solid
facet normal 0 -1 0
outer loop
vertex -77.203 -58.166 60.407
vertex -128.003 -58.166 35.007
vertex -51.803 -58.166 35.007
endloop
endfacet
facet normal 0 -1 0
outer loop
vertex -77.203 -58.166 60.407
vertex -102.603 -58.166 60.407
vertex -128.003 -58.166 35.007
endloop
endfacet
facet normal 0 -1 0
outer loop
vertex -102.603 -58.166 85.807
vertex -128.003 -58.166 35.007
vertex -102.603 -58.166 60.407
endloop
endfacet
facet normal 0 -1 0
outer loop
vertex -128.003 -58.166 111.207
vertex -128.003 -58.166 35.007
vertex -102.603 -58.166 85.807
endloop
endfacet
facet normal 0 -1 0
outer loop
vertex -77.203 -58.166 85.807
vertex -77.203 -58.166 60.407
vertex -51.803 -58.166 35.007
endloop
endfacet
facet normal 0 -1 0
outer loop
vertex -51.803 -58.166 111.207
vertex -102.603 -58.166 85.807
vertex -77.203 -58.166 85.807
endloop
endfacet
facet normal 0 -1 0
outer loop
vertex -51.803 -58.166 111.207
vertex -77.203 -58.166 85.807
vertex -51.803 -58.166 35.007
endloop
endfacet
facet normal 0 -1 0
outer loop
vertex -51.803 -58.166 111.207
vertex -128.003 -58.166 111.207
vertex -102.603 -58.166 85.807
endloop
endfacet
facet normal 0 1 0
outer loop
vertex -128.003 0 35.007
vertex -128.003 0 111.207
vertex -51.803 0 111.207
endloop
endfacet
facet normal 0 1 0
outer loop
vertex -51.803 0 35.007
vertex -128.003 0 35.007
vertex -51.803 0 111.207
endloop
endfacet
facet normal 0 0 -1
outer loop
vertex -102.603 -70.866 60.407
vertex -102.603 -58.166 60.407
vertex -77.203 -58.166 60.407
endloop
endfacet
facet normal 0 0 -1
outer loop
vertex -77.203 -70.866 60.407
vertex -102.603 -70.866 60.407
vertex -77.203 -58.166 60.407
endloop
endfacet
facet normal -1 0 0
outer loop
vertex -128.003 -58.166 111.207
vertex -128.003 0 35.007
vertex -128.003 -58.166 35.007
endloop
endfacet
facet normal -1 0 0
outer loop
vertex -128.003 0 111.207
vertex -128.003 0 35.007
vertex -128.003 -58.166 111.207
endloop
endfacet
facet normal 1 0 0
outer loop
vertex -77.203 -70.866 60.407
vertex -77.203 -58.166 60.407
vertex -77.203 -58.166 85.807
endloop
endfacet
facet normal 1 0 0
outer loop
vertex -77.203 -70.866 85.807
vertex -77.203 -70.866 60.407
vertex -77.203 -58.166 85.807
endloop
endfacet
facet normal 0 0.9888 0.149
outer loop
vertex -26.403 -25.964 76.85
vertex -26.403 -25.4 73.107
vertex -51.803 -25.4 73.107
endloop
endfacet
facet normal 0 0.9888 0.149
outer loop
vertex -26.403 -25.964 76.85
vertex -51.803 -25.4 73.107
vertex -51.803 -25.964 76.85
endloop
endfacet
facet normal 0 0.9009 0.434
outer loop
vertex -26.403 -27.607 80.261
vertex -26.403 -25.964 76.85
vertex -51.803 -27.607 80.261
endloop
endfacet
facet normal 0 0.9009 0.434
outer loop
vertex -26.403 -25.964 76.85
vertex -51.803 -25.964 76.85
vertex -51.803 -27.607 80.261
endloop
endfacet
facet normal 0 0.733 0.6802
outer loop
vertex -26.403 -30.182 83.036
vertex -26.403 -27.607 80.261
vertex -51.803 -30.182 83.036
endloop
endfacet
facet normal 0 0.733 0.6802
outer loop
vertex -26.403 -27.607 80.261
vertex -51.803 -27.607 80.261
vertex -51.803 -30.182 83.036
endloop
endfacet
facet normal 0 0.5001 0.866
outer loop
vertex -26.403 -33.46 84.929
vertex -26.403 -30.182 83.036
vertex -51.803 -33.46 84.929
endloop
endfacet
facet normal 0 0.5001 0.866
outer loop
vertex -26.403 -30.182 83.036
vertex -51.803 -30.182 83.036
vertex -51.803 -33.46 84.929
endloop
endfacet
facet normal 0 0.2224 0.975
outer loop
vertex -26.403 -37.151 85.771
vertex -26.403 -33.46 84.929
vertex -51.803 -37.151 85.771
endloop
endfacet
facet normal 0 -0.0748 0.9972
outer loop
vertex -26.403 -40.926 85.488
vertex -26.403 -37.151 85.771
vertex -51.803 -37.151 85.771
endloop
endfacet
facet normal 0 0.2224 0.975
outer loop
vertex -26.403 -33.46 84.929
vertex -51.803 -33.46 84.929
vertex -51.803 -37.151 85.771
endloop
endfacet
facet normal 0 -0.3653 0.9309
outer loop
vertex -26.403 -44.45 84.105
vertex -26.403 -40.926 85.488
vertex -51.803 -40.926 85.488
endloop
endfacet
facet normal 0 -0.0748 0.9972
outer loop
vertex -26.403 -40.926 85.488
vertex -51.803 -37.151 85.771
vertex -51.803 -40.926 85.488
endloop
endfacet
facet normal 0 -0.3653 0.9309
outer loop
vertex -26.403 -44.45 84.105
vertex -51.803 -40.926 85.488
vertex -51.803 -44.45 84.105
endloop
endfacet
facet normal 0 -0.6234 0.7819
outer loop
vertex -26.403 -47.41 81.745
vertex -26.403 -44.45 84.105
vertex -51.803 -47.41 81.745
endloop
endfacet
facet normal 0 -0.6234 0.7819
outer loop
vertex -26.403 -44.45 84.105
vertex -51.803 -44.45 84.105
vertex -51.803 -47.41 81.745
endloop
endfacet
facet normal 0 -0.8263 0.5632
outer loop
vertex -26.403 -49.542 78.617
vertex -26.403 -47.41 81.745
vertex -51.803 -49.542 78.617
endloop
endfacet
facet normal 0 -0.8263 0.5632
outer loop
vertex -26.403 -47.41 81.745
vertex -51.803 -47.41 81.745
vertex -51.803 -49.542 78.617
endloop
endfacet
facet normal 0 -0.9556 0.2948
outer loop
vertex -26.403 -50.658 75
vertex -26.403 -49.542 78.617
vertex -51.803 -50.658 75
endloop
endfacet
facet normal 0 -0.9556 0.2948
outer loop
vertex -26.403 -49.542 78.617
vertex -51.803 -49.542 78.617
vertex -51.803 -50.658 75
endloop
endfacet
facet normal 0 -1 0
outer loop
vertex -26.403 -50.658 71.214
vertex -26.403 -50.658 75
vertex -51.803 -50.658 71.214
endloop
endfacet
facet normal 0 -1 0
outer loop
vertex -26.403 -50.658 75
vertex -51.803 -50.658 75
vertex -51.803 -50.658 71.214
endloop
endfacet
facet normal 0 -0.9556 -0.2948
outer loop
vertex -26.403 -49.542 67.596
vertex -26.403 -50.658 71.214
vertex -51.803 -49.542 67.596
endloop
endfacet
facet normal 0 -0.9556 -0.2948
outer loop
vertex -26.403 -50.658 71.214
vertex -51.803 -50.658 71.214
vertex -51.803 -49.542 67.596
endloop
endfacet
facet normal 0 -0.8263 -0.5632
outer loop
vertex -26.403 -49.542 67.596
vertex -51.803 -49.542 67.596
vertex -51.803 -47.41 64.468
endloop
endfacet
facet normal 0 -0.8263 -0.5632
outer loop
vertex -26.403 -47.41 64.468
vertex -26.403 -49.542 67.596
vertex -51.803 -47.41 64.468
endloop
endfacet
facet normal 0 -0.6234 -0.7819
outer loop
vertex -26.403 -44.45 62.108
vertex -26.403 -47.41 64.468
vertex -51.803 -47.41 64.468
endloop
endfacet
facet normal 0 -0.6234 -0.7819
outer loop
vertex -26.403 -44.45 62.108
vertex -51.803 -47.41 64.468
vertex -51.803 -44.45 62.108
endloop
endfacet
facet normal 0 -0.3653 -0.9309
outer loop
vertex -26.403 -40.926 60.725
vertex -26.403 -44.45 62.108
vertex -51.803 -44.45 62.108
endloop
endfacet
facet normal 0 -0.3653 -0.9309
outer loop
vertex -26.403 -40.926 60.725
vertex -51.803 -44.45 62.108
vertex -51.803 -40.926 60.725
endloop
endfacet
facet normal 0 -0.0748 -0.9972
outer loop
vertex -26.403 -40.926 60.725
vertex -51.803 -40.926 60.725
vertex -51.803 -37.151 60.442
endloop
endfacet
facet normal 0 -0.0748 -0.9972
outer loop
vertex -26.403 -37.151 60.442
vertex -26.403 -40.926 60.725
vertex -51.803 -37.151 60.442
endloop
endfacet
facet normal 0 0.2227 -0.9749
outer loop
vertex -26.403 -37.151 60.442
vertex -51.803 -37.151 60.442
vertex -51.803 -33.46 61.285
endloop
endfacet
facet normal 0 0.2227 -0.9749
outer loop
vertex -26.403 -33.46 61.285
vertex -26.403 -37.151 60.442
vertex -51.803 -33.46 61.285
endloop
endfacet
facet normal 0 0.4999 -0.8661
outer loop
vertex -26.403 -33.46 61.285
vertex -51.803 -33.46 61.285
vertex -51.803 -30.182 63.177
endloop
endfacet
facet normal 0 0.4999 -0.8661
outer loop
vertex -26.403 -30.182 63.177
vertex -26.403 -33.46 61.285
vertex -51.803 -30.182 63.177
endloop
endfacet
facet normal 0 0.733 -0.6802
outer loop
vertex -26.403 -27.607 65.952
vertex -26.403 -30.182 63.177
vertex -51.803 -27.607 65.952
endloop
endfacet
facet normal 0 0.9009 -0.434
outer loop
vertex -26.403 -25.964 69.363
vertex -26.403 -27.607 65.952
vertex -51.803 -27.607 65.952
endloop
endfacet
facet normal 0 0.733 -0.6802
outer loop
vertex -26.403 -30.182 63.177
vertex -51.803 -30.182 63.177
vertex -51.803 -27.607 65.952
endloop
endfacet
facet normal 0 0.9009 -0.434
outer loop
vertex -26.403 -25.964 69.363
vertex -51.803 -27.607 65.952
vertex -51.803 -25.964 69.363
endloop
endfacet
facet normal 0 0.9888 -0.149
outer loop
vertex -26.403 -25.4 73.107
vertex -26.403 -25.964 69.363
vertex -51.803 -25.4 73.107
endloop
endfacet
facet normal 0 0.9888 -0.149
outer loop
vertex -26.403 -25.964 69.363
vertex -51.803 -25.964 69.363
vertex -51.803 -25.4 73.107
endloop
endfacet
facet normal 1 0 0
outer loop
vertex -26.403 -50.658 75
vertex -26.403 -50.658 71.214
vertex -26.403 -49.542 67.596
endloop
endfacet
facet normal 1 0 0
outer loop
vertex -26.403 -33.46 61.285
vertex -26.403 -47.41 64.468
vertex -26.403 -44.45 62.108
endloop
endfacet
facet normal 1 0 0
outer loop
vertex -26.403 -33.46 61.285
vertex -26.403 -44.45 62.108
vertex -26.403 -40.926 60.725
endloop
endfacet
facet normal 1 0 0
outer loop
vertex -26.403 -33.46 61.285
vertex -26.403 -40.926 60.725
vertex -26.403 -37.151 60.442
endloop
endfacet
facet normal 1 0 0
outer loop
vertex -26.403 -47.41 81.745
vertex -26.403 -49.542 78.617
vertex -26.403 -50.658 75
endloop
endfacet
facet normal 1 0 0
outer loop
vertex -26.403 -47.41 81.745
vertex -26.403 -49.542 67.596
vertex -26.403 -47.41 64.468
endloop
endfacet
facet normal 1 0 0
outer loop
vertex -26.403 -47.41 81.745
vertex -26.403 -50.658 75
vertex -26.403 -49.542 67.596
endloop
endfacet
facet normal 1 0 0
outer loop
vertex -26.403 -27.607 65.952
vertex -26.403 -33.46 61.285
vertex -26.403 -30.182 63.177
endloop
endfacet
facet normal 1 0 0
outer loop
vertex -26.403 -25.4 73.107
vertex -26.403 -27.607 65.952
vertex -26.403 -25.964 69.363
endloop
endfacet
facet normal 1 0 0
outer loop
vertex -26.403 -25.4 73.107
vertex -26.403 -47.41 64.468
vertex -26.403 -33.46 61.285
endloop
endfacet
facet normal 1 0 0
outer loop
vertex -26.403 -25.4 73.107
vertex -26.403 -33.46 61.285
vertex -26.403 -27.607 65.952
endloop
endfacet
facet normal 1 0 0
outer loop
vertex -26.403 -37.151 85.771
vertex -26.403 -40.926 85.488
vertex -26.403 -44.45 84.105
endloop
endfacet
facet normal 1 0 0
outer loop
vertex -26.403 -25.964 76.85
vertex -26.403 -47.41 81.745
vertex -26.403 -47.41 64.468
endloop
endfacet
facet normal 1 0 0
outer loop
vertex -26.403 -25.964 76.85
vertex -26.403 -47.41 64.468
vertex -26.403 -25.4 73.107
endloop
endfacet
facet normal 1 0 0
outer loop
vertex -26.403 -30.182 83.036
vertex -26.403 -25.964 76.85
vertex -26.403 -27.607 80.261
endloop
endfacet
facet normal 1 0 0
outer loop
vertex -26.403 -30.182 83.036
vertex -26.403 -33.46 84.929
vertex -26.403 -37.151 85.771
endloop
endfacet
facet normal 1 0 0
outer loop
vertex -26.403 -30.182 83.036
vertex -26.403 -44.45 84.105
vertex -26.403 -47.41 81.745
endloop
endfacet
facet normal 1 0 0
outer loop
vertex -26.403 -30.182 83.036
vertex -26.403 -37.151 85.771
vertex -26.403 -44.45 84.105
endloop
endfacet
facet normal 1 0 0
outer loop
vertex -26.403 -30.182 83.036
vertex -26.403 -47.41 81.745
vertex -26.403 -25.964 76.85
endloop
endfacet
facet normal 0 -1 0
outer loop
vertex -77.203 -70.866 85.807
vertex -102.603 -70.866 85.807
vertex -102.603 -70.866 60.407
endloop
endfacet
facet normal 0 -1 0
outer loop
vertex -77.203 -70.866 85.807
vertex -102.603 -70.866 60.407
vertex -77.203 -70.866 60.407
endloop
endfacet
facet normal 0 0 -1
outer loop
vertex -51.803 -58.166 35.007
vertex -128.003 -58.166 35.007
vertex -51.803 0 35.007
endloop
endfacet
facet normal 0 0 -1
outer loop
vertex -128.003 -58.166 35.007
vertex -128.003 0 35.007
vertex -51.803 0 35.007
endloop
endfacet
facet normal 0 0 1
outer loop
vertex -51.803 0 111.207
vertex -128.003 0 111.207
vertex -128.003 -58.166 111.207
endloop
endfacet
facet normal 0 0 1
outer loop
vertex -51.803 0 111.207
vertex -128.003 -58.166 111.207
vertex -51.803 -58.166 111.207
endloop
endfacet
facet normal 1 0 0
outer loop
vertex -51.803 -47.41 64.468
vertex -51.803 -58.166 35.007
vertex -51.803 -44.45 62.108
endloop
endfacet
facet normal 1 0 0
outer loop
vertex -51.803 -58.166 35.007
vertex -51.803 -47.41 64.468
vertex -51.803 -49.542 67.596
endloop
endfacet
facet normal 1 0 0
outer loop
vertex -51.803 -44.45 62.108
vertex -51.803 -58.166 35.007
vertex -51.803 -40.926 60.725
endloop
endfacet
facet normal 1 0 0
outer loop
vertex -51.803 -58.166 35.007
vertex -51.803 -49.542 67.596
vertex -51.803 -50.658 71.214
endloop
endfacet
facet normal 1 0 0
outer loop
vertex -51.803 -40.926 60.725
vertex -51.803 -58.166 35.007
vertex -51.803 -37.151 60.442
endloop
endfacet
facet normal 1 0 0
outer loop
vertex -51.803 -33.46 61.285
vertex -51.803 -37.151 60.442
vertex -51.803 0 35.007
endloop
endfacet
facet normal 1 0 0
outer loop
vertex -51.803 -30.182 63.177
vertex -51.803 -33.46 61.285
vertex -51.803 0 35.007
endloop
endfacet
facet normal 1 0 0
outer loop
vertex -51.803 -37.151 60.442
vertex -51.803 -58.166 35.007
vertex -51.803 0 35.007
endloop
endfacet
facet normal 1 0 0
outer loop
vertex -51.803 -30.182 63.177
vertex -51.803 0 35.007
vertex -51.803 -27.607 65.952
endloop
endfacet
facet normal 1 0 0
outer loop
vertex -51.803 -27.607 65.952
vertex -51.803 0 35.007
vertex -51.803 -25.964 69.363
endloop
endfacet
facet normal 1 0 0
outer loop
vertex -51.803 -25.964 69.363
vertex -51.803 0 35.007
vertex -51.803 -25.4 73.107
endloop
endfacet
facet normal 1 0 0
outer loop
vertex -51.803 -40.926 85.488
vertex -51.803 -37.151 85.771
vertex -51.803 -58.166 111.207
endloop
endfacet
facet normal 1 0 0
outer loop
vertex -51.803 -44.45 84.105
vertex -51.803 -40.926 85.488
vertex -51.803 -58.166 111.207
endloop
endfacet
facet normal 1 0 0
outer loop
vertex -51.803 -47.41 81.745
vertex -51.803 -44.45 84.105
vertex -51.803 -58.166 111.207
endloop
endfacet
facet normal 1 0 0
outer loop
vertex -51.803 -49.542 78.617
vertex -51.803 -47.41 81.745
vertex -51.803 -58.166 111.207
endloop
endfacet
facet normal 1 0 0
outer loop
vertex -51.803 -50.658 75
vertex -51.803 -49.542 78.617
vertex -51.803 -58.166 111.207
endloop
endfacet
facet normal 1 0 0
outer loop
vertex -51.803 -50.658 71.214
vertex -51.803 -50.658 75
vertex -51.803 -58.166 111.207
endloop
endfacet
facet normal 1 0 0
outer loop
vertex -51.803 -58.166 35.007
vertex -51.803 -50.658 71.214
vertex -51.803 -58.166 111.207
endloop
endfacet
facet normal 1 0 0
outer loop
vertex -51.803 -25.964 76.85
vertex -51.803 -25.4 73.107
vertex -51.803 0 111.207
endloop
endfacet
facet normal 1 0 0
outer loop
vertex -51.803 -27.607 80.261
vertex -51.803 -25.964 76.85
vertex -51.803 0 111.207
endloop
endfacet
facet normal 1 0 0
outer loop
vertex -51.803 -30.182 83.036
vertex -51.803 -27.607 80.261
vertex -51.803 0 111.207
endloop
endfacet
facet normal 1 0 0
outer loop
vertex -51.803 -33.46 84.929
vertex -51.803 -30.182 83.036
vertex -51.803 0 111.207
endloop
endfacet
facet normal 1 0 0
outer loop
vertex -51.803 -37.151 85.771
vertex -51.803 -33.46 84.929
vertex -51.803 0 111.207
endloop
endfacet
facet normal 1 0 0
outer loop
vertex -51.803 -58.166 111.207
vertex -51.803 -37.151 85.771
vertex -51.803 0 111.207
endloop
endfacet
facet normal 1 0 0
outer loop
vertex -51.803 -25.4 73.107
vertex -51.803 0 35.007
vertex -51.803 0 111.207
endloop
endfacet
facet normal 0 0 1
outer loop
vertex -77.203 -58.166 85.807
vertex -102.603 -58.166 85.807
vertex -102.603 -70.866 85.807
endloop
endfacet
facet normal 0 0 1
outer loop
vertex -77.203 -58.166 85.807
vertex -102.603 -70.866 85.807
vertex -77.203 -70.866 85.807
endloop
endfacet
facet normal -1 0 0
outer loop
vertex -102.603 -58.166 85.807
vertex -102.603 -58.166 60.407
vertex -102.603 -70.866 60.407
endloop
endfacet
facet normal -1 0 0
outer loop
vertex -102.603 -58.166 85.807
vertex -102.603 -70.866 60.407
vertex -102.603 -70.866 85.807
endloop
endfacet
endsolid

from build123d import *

# Parameters (mm, degrees)
F0_W      = 76.2
F0_H      = 76.2
F1_DEPTH  = 25.4
F1_FACE_W = 76.2
F1_FACE_H = 76.2
F2_DEPTH  = 32.766
F3_W      = 25.4
F3_H      = 25.4
F4_DEPTH  = 12.7
F5_R      = 12.7
F7_DEPTH  = 25.4


with BuildPart() as f1:
    # F0 (on Front) → F1 (new body)
    with BuildSketch(Plane.XZ):
        with Locations((-89.903427, 73.106664)):
            Rectangle(F0_W, F0_H)
    extrude(amount=F1_DEPTH)

    # F1_face (on face) → F2 (join)
    with BuildSketch(Plane(origin=(-89.903427, -25.4, 73.106664), x_dir=(1, 0, 0), z_dir=(0, -1, 0))):
        Rectangle(F1_FACE_W, F1_FACE_H)
    extrude(amount=F2_DEPTH)

    # F3 (on face) → F4 (join)
    with BuildSketch(Plane.XZ.offset(58.166)):
        with Locations((-89.903427, 73.106664)):
            Rectangle(F3_W, F3_H)
    extrude(amount=F4_DEPTH)

    # F5 (on face) → F7 (join)
    with BuildSketch(Plane.YZ.offset(-51.803427)):
        with Locations((-38.1, 73.106664)):
            Circle(F5_R)
    extrude(amount=F7_DEPTH)


solid = f1.part
